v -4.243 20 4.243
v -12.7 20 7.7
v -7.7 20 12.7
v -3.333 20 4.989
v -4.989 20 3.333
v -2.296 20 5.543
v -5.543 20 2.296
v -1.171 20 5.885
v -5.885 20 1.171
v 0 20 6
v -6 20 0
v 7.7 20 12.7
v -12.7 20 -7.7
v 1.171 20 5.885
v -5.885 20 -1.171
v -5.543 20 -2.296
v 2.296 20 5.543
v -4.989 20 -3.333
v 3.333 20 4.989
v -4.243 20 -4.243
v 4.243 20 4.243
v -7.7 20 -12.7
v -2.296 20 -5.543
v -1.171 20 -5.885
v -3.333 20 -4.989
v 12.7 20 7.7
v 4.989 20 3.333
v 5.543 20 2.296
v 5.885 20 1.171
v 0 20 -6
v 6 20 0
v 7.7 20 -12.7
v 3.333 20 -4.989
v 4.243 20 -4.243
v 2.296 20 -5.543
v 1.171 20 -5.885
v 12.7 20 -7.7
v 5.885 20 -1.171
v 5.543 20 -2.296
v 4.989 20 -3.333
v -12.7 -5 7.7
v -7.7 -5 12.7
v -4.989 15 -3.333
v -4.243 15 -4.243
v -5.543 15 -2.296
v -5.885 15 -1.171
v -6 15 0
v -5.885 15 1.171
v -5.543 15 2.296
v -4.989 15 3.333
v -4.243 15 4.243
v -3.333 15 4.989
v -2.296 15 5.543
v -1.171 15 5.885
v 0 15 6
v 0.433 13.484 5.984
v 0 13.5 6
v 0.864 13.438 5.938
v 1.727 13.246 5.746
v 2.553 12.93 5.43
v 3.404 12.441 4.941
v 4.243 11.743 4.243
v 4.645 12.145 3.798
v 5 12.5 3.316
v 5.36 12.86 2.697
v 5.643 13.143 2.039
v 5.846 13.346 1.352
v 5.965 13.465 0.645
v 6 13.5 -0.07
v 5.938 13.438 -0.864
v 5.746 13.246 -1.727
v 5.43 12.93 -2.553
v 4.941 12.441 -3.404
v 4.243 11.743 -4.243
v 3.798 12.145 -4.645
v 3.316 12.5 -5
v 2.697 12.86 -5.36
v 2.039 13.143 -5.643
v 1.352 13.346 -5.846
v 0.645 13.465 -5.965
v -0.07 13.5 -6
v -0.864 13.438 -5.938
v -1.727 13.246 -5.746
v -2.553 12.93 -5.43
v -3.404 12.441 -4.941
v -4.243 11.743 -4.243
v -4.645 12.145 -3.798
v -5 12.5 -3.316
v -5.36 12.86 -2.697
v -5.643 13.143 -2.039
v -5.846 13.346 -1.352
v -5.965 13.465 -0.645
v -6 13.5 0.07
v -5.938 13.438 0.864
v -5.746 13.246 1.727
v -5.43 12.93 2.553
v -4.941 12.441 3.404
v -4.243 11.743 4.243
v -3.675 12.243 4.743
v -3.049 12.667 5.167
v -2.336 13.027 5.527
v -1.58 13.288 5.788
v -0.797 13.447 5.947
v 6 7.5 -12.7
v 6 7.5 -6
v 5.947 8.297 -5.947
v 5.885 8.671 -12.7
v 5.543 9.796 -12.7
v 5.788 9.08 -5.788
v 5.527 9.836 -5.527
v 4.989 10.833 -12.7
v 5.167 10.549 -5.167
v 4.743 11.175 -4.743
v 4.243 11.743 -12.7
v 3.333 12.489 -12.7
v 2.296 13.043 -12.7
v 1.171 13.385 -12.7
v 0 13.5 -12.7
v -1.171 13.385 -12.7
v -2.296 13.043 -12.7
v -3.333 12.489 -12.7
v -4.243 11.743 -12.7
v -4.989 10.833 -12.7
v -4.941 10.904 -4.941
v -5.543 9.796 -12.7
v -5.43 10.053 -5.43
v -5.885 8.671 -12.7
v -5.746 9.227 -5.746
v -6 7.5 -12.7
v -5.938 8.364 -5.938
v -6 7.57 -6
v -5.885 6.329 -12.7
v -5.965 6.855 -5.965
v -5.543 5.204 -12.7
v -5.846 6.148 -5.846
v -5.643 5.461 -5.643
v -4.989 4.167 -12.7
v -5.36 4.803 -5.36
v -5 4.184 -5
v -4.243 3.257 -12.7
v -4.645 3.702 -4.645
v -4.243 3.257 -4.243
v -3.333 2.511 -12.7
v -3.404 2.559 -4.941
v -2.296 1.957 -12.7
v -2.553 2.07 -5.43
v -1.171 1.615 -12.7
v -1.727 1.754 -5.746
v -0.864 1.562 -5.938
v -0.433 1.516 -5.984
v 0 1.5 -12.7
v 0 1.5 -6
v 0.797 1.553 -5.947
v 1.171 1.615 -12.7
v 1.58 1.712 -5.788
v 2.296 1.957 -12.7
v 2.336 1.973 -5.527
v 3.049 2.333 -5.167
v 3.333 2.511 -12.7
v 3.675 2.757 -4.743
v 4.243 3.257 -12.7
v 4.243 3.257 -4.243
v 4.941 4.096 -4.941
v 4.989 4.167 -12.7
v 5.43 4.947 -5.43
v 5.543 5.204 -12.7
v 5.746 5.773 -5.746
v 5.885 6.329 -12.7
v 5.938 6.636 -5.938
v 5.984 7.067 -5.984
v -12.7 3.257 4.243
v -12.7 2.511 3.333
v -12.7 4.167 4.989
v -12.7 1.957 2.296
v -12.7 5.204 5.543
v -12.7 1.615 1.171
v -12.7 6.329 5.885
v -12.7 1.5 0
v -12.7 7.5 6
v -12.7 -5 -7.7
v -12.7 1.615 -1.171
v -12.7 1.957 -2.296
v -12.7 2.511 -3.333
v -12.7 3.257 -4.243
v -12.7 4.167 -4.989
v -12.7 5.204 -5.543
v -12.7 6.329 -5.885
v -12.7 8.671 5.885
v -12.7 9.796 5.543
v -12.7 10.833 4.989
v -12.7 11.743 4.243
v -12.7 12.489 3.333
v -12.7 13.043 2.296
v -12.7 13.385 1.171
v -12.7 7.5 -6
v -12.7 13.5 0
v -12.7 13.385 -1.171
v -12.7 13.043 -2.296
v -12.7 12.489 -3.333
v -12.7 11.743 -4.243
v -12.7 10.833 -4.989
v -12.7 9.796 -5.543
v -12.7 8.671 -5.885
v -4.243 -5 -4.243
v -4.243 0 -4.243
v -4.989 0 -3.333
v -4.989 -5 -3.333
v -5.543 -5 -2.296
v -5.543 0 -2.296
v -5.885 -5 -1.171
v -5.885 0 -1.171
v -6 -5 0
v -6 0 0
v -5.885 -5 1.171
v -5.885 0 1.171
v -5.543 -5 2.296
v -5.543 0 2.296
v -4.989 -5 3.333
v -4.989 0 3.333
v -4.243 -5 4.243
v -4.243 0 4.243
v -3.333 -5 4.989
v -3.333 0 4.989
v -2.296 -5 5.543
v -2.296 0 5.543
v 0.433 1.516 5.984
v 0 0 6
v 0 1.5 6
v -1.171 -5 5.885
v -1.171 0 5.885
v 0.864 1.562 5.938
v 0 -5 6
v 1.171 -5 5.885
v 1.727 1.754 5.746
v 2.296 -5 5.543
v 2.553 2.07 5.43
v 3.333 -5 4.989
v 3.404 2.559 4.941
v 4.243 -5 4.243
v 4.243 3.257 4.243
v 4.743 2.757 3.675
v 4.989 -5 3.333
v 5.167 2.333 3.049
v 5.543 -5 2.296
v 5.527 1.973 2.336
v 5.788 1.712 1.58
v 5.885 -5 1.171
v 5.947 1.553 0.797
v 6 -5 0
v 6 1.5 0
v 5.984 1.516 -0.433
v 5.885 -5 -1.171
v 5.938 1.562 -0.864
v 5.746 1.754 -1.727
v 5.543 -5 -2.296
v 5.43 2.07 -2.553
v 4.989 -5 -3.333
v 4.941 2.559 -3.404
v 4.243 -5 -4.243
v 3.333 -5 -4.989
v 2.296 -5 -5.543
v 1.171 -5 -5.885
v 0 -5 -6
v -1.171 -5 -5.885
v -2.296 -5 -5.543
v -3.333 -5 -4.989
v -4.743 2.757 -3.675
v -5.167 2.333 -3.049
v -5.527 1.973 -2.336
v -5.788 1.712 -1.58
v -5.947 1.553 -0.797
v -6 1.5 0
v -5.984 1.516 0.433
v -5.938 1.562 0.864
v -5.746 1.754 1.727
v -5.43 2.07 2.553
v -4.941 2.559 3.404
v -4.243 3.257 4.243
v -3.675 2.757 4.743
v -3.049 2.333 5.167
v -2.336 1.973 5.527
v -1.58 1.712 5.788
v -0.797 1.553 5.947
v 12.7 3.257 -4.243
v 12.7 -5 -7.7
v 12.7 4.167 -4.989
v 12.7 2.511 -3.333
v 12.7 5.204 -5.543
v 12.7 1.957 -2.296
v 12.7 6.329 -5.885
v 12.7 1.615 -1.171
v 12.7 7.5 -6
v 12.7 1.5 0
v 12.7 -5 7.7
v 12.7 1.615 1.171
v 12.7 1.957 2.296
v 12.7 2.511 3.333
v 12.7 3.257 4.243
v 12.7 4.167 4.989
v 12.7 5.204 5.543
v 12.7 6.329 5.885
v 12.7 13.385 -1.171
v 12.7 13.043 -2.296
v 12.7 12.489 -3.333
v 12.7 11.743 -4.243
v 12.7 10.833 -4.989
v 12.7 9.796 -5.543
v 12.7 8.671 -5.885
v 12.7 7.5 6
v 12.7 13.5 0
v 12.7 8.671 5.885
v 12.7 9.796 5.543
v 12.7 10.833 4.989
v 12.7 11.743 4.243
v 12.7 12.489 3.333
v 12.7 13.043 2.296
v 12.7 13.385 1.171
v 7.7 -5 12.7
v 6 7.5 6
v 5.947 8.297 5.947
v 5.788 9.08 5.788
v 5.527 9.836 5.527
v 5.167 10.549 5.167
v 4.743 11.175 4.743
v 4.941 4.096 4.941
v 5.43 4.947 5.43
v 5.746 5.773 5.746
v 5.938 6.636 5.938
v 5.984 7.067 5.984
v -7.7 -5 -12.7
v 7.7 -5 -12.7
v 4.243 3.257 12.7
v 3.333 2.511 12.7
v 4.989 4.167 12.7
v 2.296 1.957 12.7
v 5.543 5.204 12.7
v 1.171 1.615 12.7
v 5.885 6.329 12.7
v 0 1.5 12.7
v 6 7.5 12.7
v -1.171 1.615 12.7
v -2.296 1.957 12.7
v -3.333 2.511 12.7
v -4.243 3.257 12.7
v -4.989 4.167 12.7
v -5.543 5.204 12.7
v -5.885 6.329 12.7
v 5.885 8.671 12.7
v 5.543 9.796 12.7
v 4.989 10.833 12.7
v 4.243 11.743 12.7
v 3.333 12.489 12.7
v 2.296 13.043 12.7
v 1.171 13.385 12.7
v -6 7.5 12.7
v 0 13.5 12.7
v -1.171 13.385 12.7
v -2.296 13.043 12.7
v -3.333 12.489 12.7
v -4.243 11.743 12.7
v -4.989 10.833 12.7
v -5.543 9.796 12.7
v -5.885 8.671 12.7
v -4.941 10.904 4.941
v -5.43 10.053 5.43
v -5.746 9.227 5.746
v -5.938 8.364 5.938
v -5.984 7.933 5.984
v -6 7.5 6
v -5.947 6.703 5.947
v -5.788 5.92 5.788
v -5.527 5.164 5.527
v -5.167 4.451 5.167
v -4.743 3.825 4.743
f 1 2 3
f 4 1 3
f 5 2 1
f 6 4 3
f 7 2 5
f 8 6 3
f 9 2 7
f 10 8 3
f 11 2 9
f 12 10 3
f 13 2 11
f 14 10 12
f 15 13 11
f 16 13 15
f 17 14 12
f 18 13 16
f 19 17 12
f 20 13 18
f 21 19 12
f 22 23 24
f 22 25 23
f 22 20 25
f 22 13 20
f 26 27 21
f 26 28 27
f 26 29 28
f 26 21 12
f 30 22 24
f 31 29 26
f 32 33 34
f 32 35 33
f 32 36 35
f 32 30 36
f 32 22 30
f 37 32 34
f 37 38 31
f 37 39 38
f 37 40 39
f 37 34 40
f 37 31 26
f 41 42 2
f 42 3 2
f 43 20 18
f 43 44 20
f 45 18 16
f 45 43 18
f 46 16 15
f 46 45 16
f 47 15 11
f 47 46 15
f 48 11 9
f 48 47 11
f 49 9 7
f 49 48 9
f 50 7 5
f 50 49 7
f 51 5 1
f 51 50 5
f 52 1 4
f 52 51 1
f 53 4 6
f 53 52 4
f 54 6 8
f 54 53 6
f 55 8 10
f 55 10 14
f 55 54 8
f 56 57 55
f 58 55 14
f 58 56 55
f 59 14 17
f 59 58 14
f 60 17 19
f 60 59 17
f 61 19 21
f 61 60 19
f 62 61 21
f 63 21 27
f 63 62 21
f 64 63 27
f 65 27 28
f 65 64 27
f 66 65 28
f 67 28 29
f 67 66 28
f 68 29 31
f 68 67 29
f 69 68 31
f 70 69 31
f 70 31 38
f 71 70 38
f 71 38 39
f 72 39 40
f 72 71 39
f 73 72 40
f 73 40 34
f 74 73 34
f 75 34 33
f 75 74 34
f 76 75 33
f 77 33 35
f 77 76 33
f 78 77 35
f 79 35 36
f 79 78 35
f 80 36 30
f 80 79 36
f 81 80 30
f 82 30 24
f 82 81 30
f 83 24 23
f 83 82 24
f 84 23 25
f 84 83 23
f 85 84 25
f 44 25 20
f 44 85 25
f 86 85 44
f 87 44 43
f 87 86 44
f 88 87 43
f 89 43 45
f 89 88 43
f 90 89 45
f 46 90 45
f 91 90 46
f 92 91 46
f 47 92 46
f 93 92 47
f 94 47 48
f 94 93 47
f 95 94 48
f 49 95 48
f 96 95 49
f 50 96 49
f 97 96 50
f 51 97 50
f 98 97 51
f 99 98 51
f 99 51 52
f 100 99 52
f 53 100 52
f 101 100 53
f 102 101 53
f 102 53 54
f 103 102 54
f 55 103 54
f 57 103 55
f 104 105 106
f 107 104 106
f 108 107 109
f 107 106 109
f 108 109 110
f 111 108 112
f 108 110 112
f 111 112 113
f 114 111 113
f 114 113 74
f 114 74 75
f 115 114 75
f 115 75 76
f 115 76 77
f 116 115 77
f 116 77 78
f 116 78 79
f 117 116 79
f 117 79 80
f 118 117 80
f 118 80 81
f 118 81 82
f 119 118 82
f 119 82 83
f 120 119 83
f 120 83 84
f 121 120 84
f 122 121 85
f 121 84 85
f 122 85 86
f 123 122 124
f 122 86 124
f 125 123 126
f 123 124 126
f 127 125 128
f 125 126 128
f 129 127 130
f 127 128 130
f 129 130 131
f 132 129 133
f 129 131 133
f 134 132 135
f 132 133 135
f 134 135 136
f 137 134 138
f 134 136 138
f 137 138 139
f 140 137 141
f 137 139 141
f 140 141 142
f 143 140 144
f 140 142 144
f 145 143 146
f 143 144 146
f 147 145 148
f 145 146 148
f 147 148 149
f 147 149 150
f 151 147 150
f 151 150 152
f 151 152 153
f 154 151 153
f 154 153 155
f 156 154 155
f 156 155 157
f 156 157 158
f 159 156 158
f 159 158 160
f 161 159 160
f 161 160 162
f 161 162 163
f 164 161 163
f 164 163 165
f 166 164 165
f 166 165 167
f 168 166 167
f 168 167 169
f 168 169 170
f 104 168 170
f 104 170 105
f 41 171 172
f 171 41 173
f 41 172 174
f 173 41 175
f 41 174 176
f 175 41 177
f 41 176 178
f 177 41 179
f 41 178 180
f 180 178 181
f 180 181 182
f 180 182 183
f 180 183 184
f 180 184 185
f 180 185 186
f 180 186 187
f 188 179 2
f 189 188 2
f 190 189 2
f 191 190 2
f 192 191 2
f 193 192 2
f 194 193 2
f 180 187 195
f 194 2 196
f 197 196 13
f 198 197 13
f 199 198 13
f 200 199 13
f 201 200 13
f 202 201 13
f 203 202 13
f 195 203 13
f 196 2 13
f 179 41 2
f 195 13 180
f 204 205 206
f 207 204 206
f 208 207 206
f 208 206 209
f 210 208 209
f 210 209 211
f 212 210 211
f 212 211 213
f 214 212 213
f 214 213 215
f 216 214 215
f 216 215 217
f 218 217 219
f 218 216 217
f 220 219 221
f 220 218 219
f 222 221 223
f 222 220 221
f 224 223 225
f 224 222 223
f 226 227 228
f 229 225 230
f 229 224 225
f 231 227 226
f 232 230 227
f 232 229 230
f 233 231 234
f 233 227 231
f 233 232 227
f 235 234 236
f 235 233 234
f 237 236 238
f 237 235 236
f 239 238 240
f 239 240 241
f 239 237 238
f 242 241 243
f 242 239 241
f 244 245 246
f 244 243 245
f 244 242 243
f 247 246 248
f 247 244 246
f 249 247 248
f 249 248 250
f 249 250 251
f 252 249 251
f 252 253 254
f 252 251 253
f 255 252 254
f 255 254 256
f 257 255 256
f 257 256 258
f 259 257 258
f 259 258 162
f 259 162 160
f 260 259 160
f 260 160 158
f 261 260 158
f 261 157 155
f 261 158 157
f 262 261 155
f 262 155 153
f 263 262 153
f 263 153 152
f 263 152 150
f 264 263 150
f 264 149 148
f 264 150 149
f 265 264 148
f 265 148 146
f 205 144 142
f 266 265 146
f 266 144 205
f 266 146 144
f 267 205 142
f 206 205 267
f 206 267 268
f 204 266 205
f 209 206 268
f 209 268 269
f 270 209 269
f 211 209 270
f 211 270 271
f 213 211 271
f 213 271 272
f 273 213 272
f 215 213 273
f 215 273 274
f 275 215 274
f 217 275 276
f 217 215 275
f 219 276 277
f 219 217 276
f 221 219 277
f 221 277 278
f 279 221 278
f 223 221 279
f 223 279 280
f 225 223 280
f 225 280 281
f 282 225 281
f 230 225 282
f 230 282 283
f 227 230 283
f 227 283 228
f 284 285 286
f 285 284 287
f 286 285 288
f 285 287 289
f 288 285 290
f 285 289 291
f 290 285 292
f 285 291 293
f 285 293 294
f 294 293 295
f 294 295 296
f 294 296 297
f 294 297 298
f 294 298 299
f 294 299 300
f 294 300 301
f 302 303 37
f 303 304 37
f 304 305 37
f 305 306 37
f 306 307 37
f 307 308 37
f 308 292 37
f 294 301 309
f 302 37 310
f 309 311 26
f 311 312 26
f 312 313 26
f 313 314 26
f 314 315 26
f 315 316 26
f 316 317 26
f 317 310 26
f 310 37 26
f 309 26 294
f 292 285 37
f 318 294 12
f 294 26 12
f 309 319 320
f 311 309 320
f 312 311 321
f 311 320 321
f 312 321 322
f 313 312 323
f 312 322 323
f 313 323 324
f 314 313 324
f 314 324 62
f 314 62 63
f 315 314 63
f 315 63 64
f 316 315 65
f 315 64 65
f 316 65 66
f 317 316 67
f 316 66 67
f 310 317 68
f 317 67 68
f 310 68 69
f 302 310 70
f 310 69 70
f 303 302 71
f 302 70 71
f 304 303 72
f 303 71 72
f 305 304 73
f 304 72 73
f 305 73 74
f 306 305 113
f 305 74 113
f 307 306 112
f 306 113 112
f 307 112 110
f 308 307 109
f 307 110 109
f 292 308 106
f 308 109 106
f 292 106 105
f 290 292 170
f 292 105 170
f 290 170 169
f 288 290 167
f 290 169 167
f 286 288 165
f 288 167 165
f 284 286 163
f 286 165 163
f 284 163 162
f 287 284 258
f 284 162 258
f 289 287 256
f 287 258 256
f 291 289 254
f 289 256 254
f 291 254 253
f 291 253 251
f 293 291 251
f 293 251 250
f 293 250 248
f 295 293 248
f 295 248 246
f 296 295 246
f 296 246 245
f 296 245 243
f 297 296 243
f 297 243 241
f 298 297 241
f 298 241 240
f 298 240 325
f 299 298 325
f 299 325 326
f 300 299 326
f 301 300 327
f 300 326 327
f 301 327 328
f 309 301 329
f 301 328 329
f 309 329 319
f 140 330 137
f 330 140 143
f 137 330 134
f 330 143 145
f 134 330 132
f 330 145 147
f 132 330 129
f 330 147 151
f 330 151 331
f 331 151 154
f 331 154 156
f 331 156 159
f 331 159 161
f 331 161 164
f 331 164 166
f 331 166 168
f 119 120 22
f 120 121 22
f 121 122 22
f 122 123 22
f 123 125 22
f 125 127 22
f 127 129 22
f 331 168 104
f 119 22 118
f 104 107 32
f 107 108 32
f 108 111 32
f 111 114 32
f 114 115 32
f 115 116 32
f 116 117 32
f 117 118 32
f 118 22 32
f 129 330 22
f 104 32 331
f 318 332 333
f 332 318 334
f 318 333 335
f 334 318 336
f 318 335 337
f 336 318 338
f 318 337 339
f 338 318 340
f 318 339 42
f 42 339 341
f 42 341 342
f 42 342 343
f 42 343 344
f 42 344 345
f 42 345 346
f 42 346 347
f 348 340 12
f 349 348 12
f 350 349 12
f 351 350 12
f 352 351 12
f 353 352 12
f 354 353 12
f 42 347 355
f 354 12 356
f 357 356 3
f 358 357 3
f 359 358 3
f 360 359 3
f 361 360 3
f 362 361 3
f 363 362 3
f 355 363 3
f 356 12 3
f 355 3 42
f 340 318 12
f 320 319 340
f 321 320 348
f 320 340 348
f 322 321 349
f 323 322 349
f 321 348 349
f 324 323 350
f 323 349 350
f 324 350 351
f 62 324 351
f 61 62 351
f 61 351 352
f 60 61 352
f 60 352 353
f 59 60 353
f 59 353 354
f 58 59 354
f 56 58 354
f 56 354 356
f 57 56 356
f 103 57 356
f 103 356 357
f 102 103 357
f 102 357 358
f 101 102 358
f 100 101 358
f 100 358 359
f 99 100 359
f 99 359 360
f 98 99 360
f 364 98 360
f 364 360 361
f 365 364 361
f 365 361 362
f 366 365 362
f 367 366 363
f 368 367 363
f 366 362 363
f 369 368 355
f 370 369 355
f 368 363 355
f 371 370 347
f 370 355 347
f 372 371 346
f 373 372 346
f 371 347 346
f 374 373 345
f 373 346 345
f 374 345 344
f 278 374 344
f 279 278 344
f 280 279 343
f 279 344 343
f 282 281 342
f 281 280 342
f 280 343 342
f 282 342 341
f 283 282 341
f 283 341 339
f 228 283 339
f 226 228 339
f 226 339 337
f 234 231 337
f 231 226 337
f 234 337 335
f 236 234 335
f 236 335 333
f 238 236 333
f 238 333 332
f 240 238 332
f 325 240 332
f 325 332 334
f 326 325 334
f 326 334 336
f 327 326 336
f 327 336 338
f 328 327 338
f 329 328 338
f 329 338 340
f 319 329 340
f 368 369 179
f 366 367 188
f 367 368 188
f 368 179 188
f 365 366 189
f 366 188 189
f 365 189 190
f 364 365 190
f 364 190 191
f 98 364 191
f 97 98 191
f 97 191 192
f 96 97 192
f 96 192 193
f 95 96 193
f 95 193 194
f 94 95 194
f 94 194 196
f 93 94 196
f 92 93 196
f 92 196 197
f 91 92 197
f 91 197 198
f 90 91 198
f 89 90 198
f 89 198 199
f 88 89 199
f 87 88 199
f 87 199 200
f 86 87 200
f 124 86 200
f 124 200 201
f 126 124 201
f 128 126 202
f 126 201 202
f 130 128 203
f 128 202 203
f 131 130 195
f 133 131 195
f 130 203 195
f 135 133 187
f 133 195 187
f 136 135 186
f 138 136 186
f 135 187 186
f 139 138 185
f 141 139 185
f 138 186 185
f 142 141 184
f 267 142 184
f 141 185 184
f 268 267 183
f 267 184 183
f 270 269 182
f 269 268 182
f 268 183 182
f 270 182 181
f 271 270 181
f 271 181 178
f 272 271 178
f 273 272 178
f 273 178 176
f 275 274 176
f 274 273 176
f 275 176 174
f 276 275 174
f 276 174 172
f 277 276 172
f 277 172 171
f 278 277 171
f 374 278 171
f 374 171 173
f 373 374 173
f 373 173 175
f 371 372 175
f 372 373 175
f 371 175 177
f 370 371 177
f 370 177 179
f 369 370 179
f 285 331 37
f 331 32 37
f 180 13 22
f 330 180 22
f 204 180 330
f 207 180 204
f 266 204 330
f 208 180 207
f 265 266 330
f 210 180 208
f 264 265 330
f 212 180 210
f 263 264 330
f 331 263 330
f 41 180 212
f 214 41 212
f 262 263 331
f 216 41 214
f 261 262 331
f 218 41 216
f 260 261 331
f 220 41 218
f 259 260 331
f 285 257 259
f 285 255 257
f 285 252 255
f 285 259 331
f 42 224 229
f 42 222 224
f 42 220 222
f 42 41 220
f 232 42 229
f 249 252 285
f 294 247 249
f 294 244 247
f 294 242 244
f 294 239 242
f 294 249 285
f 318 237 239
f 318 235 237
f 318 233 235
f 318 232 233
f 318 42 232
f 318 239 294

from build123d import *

# Parameters (mm, degrees)
SKETCH1_R           = 6
BOSS_EXTRUDE1_DEPTH = 15
SKETCH2_R           = 6
CUT_EXTRUDE1_DEPTH  = 32
SKETCH3_R           = 6
CUT_EXTRUDE2_DEPTH  = 32
BOSS_EXTRUDE2_DEPTH = 5
BOSS_EXTRUDE3_DEPTH = 5
CUT_EXTRUDE3_START  = -31
SKETCH8_R           = 6
CUT_EXTRUDE3_DEPTH  = 31


with BuildPart() as part:
    # Sketch1 → Boss-Extrude1 (new body)
    with BuildSketch(Plane(origin=(0, 0, 0), x_dir=(1, 0, 0), z_dir=(0, 1, 0))):
        Polygon((-7.7, 12.7), (-12.7, 7.7), (-12.7, -7.7), (-7.7, -12.7), (7.7, -12.7), (12.7, -7.7), (12.7, 7.7), (7.7, 12.7), align=None)
        with Locations(Location((0, 0, 0), (0, 0, 270))):
            Circle(SKETCH1_R, mode=Mode.SUBTRACT)
    extrude(amount=BOSS_EXTRUDE1_DEPTH)

    # Sketch2 → Cut-Extrude1 (cut)
    with BuildSketch(Plane.XY.offset(12.7)):
        with Locations((0, 7.5)):
            Circle(SKETCH2_R)
    extrude(amount=-CUT_EXTRUDE1_DEPTH, mode=Mode.SUBTRACT)

    # Sketch3 → Cut-Extrude2 (cut)
    with BuildSketch(Plane.ZY.offset(12.7)):
        with Locations((0, 7.5)):
            Circle(SKETCH3_R)
    extrude(amount=-CUT_EXTRUDE2_DEPTH, mode=Mode.SUBTRACT)

    # Sketch6 → Boss-Extrude2 (add)
    with BuildSketch(Plane(origin=(0, 15, 0), x_dir=(1, 0, 0), z_dir=(0, 1, 0))):
        Polygon((7.7, 12.7), (-7.7, 12.7), (-12.7, 7.7), (-12.7, -7.7), (-7.7, -12.7), (7.7, -12.7), (12.7, -7.7), (12.7, 7.7), align=None)
    extrude(amount=BOSS_EXTRUDE2_DEPTH)

    # Sketch7 → Boss-Extrude3 (add)
    with BuildSketch(Plane.XZ):
        Polygon((-7.7, -12.7), (7.7, -12.7), (12.7, -7.7), (12.7, 7.7), (7.7, 12.7), (-7.7, 12.7), (-12.7, 7.7), (-12.7, -7.7), align=None)
    extrude(amount=BOSS_EXTRUDE3_DEPTH)

    # Sketch8 → Cut-Extrude3 (cut)
    with BuildSketch(Plane(origin=(0, 20, 0), x_dir=(1, 0, 0), z_dir=(0, 1, 0)).offset(CUT_EXTRUDE3_START)):
        with Locations(Location((0, 0, 0), (0, 0, 135))):
            Circle(SKETCH8_R)
    extrude(amount=CUT_EXTRUDE3_DEPTH, mode=Mode.SUBTRACT)


solid = part.part
